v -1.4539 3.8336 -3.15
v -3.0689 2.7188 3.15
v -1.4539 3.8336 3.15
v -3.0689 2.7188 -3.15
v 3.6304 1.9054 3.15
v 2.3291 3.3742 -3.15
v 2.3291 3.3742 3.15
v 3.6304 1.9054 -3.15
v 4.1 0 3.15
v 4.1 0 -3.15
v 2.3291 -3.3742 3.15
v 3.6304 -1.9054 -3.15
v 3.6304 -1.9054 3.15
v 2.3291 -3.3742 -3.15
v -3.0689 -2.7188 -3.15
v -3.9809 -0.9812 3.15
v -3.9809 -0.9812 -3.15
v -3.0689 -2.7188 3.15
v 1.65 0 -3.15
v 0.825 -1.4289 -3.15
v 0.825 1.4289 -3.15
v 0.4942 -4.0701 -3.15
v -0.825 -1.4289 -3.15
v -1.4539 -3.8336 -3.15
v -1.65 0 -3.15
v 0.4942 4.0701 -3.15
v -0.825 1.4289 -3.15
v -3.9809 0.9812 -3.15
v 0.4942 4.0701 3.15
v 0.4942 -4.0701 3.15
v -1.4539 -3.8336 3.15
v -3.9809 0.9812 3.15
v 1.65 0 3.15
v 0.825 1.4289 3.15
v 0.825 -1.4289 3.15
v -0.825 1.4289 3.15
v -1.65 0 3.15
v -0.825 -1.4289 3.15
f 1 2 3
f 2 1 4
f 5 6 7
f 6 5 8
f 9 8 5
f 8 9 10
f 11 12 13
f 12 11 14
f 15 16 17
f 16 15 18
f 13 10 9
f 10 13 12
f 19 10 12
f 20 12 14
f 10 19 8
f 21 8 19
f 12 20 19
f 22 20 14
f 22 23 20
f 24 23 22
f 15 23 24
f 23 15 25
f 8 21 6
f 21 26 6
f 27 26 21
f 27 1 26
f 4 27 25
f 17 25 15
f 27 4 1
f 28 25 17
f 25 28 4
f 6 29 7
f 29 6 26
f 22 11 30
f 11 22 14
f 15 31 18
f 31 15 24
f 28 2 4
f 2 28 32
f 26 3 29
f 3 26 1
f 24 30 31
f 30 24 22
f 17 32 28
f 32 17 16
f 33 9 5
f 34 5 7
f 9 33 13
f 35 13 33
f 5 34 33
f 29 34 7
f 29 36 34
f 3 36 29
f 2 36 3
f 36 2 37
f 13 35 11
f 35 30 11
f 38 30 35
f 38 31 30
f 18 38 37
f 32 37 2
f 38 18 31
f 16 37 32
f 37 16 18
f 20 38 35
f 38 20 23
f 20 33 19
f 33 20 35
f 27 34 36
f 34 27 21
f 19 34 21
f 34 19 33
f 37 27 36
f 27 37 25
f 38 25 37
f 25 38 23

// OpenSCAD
// Parameters
outer_diameter_mm = 8.2; //[4.1:16.4:0.1]
length_mm = 6.3; //[3.15:12.6:0.1]
screw_diameter_mm = 4; //[2:8:0.1]
internal_thread_pitch_mm = 0.7; //[0.35:1.4:0.05]
internal_minor_diameter_mm = 3.3; //[1.65:6.6:0.05]
internal_tap_drill_mm = 3.3; //[1.65:6.6:0.05]
lead_in_chamfer_mm = 0.5; //[0.25:1:0.05]
end_chamfer_mm = 0.5; //[0.25:1:0.05]
knurl_depth_mm = 0.3; //[0.15:0.6:0.05]
knurl_pitch_mm = 0.8; //[0.4:1.6:0.05]
center_bore_through = 1; //[0:1:1]
eps_mm = 0.2; //[0.05:0.5:0.05]
knurl_ring_width_mm = 0.35; //[0.2:0.8:0.05]
knurl_ring_count = 6; //[3:14:1]
knurl_start_margin_mm = 0.9; //[0.4:1.8:0.05]

// Module for the threaded insert
module threaded_insert() {
  color([0.8, 0.6, 0.2]) { // Brass color
    difference() {
      union() {
        // Main body with chamfers
        union() {
          // Main cylindrical body
          cylinder(r=outer_diameter_mm/2, h=length_mm, center=true);
          
          // Lead-in chamfer
          translate([0, 0, length_mm/2 - lead_in_chamfer_mm/2])
            cylinder(r1=outer_diameter_mm/2, r2=0, h=lead_in_chamfer_mm, center=true);
          
          // Installation end chamfer
          translate([0, 0, -length_mm/2 + end_chamfer_mm/2])
            cylinder(r1=outer_diameter_mm/2, r2=0, h=end_chamfer_mm, center=true);
        }
        
        // Knurling effect
        scale([(outer_diameter_mm - 2*knurl_depth_mm)/outer_diameter_mm, 
               (outer_diameter_mm - 2*knurl_depth_mm)/outer_diameter_mm, 1]) {
          difference() {
            cylinder(r=outer_diameter_mm/2, h=length_mm, center=true);
            for (i = [0:knurl_ring_count-1]) {
              translate([0, 0, -length_mm/2 + knurl_start_margin_mm + (i + 0.5)*((length_mm - 2*knurl_start_margin_mm)/knurl_ring_count)])
                cylinder(r=outer_diameter_mm/2, h=knurl_ring_width_mm, center=true);
            }
          }
        }
      }
      
      // Internal bore for M4 screw
      cylinder(r=internal_tap_drill_mm/2, h=length_mm + 2*eps_mm, center=true);
    }
  }
}

// Assembly
module assembly() {
  threaded_insert();
}

assembly();
